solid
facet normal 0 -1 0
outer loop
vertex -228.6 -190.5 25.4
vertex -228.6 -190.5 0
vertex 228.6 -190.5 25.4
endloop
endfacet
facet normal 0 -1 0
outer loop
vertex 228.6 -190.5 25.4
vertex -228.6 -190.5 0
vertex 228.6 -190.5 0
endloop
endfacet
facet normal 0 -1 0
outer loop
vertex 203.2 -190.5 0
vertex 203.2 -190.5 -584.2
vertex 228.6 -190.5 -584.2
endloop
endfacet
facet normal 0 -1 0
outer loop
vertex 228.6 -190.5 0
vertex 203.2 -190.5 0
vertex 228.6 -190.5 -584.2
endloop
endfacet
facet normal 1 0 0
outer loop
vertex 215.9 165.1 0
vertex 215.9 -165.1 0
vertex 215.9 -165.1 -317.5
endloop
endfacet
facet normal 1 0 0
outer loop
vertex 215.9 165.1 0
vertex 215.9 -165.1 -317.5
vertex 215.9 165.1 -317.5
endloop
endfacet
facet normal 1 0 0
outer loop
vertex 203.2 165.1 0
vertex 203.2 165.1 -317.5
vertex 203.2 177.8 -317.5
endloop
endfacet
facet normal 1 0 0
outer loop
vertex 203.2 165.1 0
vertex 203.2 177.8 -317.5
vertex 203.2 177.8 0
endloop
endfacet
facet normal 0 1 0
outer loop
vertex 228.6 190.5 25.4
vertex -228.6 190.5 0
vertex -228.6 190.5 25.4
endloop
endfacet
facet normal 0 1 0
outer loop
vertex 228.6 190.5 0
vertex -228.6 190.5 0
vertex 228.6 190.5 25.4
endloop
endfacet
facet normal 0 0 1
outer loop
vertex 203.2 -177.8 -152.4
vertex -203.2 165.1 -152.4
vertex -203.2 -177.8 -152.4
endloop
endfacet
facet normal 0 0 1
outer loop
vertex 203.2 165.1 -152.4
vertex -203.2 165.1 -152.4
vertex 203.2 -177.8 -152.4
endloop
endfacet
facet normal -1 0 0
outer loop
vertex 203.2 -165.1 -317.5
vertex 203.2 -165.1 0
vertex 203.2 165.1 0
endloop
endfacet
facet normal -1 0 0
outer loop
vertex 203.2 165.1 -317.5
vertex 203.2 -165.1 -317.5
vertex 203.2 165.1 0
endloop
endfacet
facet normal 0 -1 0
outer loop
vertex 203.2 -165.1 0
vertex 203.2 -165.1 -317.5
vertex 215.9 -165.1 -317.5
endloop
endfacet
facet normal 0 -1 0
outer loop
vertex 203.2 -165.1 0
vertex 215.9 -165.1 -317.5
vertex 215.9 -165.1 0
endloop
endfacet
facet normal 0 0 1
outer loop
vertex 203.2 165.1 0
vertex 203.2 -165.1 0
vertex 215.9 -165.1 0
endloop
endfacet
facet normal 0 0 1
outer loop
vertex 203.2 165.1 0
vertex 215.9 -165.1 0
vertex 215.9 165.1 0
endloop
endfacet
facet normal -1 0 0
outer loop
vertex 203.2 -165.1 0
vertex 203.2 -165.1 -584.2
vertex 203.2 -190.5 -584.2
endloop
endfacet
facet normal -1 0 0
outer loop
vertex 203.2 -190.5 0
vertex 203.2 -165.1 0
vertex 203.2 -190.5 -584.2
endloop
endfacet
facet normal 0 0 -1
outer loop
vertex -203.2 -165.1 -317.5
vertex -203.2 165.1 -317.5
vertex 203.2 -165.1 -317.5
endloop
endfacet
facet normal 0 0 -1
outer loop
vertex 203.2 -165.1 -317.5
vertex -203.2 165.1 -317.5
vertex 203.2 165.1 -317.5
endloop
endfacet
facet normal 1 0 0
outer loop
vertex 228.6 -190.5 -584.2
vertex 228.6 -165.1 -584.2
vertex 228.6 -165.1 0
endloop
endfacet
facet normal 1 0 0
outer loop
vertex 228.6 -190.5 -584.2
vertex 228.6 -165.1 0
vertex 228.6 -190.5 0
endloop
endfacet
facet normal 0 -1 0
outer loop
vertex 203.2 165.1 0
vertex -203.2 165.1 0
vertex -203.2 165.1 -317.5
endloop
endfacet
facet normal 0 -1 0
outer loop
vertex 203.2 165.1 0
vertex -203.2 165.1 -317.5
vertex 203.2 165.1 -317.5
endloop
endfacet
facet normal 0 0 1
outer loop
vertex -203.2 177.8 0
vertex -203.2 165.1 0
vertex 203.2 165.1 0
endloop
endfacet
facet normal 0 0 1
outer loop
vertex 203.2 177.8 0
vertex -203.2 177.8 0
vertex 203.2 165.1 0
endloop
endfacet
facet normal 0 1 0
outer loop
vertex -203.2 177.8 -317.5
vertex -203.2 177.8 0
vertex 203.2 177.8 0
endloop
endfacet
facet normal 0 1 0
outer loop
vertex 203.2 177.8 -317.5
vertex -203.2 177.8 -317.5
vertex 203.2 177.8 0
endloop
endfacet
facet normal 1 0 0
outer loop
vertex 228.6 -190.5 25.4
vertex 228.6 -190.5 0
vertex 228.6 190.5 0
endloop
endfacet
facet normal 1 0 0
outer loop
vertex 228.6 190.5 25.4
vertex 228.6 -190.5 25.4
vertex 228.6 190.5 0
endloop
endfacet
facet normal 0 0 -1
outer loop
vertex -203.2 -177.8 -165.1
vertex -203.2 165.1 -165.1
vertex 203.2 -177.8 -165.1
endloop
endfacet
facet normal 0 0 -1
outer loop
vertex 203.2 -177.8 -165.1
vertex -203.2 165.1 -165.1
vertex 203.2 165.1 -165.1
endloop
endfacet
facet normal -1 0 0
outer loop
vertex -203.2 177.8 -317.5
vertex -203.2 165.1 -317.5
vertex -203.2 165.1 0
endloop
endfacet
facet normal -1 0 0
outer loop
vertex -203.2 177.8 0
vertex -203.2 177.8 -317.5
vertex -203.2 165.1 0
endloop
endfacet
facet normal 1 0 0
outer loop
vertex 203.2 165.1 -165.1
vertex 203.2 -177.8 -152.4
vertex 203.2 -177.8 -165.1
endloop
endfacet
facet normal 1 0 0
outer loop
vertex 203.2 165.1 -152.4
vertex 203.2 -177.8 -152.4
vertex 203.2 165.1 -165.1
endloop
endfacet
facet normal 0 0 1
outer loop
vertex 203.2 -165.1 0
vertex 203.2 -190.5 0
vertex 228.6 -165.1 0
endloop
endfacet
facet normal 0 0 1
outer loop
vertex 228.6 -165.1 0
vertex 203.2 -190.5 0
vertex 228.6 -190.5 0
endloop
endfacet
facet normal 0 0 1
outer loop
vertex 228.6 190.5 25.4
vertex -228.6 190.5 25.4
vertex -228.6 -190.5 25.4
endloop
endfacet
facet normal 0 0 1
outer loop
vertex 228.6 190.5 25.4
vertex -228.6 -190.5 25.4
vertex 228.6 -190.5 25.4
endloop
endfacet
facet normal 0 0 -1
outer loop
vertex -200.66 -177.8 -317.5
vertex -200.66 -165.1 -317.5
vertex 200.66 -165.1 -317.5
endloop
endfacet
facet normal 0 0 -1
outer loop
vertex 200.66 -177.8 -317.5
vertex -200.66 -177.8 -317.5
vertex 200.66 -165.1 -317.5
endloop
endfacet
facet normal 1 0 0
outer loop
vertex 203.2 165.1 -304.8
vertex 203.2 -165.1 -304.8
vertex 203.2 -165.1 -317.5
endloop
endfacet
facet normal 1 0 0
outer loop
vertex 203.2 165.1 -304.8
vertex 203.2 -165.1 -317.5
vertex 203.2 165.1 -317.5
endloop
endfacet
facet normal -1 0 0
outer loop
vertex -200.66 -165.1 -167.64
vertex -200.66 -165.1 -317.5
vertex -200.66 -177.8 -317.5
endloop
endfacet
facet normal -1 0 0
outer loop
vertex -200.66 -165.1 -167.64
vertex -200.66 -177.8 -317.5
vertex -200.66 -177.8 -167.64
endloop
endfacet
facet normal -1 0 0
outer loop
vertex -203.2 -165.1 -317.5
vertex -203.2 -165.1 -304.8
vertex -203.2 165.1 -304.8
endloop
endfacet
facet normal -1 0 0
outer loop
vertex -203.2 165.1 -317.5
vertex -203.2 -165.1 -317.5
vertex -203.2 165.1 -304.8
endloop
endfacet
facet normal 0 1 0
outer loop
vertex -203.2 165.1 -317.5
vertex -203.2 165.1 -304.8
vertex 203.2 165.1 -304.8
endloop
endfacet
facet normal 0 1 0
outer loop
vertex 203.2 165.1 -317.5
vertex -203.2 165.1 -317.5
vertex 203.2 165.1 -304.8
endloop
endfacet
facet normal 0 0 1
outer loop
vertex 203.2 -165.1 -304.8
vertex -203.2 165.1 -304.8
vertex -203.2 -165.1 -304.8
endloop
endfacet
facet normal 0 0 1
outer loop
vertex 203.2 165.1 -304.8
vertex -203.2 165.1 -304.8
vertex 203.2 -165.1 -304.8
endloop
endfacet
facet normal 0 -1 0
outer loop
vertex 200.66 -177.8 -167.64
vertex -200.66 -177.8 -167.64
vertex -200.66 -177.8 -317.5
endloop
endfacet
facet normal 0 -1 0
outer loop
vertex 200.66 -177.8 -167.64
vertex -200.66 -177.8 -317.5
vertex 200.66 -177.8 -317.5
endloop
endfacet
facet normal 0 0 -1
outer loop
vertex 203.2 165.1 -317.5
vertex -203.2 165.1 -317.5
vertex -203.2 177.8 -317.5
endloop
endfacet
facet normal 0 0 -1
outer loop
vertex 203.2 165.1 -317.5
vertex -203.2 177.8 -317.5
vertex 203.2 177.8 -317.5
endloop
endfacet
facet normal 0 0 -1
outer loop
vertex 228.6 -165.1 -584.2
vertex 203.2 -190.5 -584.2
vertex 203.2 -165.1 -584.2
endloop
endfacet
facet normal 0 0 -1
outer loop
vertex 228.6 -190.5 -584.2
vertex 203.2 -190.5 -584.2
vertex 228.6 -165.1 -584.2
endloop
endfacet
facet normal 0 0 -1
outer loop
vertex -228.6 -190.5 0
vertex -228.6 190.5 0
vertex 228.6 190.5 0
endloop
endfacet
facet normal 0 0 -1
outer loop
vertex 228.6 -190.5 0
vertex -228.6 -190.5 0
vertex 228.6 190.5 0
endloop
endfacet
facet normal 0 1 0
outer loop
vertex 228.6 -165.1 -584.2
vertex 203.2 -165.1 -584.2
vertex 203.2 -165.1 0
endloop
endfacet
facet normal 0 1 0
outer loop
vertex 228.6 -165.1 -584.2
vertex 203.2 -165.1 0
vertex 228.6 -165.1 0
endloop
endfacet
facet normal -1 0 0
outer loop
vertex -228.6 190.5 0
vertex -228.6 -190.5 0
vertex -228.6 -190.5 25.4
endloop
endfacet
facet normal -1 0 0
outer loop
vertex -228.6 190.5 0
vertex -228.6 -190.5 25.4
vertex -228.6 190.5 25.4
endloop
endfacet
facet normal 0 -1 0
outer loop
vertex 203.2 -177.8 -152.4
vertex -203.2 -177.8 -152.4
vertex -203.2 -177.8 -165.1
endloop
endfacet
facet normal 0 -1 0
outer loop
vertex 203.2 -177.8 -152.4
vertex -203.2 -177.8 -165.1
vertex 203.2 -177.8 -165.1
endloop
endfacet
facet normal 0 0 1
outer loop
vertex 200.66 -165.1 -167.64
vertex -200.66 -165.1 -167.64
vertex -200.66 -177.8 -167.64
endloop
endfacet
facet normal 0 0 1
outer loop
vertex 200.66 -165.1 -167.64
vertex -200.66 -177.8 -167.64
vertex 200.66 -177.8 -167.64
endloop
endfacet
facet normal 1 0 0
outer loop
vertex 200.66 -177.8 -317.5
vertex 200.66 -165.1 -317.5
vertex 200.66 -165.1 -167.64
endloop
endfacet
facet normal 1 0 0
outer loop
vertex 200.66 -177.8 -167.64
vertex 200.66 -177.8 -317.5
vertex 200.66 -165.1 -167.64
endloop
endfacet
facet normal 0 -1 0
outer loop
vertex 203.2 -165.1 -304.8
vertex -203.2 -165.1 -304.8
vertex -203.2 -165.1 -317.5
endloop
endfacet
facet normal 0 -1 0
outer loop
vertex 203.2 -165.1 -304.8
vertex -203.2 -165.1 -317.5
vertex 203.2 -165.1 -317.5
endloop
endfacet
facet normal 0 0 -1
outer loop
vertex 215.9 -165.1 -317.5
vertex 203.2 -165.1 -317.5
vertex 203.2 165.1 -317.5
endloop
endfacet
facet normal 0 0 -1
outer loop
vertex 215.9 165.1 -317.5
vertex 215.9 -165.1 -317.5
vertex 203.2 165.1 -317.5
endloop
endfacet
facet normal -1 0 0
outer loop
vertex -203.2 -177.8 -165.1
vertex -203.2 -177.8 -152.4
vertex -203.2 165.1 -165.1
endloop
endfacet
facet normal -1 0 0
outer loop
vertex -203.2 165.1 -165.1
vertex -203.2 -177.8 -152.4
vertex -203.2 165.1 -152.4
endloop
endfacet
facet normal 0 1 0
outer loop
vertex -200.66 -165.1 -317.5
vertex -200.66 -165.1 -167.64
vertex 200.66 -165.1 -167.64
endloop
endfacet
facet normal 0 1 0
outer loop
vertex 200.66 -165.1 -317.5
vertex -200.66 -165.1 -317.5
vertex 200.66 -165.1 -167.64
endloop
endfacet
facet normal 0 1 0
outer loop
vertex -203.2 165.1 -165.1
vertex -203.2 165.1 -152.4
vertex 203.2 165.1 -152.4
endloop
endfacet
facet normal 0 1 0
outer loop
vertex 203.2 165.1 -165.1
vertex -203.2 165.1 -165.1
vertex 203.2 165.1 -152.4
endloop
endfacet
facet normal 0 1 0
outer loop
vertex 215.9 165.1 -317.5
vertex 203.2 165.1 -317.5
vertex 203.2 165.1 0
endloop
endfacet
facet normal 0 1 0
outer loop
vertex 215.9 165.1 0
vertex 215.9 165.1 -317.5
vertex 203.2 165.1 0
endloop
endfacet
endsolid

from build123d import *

# Parameters (mm, degrees)
F0_W      = 457.2
F0_H      = 381
F1_DEPTH  = 25.4
F2_W      = 25.4
F2_H      = 25.4
F3_DEPTH  = 584.2
F5_W      = 406.4
F5_H      = 330.2
F6_DEPTH  = 12.7
F8_W      = 330.2
F8_H      = 317.5
F9_DEPTH  = 12.7
F11_W     = 406.4
F11_H     = 317.5
F12_DEPTH = 12.7
F14_W     = 401.32
F14_H     = 149.86
F15_DEPTH = 12.7
F17_W     = 406.4
F17_H     = 342.9
F18_DEPTH = 12.7


with BuildPart() as f1:
    # F0 (on Top) → F1 (new body)
    with BuildSketch(Plane.XY):
        Rectangle(F0_W, F0_H)
    extrude(amount=F1_DEPTH)


with BuildPart() as f3:
    # F2 (on face) → F3 (new body)
    with BuildSketch(Plane(origin=(0, 0, 0), x_dir=(1, 0, 0), z_dir=(0, 0, -1))):
        with Locations((215.9, 177.8)):
            Rectangle(F2_W, F2_H)
    extrude(amount=F3_DEPTH)


with BuildPart() as f6:
    # F5 (on offset) → F6 (new body)
    with BuildSketch(Plane.XY.offset(-304.8)):
        Rectangle(F5_W, F5_H)
    extrude(amount=-F6_DEPTH)


with BuildPart() as f9:
    # F8 (on offset) → F9 (new body)
    with BuildSketch(Plane.YZ.offset(203.2)):
        with Locations((0, -158.75)):
            Rectangle(F8_W, F8_H)
    extrude(amount=F9_DEPTH)


with BuildPart() as f12:
    # F11 (on offset) → F12 (new body)
    with BuildSketch(Plane.XZ.offset(-165.1)):
        with Locations((0, -158.75)):
            Rectangle(F11_W, F11_H)
    extrude(amount=-F12_DEPTH)


with BuildPart() as f15:
    # F14 (on offset) → F15 (new body)
    with BuildSketch(Plane.XZ.offset(165.1)):
        with Locations((0, -242.57)):
            Rectangle(F14_W, F14_H)
    extrude(amount=F15_DEPTH)


with BuildPart() as f18:
    # F17 (on offset) → F18 (new body)
    with BuildSketch(Plane.XY.offset(-152.4)):
        with Locations((0, -6.35)):
            Rectangle(F17_W, F17_H)
    extrude(amount=-F18_DEPTH)


solid = Compound([f1.part, f3.part, f6.part, f9.part, f12.part, f15.part, f18.part])
